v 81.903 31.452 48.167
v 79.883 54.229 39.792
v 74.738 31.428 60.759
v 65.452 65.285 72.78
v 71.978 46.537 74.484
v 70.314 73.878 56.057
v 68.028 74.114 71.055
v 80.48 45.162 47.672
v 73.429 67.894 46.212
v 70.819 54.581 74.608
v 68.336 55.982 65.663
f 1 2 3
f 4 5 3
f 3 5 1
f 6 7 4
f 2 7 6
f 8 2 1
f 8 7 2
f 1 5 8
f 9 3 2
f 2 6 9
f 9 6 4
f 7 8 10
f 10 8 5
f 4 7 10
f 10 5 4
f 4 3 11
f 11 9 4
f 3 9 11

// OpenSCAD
// Auto-generated auxetic polyhedron
points = [
    [74.737953, 31.428100, 60.758514],
    [79.882648, 54.228856, 39.791988],
    [81.902738, 31.452315, 48.166802],
    [71.977651, 46.536569, 74.484131],
    [65.452126, 65.284567, 72.780463],
    [68.027740, 74.113559, 71.054809],
    [70.313959, 73.877866, 56.056982],
    [80.479823, 45.162342, 47.672247],
    [73.428903, 67.894217, 46.211809],
    [70.819306, 54.580792, 74.608366],
    [68.335519, 55.982360, 65.662896],
];

faces = [
    [0, 1, 2],
    [0, 3, 4],
    [2, 3, 0],
    [4, 5, 6],
    [6, 5, 1],
    [2, 1, 7],
    [1, 5, 7],
    [7, 3, 2],
    [1, 0, 8],
    [8, 6, 1],
    [4, 6, 8],
    [9, 7, 5],
    [3, 7, 9],
    [9, 5, 4],
    [4, 3, 9],
    [10, 0, 4],
    [4, 8, 10],
    [10, 8, 0],
];

polyhedron(points = points, faces = faces);
